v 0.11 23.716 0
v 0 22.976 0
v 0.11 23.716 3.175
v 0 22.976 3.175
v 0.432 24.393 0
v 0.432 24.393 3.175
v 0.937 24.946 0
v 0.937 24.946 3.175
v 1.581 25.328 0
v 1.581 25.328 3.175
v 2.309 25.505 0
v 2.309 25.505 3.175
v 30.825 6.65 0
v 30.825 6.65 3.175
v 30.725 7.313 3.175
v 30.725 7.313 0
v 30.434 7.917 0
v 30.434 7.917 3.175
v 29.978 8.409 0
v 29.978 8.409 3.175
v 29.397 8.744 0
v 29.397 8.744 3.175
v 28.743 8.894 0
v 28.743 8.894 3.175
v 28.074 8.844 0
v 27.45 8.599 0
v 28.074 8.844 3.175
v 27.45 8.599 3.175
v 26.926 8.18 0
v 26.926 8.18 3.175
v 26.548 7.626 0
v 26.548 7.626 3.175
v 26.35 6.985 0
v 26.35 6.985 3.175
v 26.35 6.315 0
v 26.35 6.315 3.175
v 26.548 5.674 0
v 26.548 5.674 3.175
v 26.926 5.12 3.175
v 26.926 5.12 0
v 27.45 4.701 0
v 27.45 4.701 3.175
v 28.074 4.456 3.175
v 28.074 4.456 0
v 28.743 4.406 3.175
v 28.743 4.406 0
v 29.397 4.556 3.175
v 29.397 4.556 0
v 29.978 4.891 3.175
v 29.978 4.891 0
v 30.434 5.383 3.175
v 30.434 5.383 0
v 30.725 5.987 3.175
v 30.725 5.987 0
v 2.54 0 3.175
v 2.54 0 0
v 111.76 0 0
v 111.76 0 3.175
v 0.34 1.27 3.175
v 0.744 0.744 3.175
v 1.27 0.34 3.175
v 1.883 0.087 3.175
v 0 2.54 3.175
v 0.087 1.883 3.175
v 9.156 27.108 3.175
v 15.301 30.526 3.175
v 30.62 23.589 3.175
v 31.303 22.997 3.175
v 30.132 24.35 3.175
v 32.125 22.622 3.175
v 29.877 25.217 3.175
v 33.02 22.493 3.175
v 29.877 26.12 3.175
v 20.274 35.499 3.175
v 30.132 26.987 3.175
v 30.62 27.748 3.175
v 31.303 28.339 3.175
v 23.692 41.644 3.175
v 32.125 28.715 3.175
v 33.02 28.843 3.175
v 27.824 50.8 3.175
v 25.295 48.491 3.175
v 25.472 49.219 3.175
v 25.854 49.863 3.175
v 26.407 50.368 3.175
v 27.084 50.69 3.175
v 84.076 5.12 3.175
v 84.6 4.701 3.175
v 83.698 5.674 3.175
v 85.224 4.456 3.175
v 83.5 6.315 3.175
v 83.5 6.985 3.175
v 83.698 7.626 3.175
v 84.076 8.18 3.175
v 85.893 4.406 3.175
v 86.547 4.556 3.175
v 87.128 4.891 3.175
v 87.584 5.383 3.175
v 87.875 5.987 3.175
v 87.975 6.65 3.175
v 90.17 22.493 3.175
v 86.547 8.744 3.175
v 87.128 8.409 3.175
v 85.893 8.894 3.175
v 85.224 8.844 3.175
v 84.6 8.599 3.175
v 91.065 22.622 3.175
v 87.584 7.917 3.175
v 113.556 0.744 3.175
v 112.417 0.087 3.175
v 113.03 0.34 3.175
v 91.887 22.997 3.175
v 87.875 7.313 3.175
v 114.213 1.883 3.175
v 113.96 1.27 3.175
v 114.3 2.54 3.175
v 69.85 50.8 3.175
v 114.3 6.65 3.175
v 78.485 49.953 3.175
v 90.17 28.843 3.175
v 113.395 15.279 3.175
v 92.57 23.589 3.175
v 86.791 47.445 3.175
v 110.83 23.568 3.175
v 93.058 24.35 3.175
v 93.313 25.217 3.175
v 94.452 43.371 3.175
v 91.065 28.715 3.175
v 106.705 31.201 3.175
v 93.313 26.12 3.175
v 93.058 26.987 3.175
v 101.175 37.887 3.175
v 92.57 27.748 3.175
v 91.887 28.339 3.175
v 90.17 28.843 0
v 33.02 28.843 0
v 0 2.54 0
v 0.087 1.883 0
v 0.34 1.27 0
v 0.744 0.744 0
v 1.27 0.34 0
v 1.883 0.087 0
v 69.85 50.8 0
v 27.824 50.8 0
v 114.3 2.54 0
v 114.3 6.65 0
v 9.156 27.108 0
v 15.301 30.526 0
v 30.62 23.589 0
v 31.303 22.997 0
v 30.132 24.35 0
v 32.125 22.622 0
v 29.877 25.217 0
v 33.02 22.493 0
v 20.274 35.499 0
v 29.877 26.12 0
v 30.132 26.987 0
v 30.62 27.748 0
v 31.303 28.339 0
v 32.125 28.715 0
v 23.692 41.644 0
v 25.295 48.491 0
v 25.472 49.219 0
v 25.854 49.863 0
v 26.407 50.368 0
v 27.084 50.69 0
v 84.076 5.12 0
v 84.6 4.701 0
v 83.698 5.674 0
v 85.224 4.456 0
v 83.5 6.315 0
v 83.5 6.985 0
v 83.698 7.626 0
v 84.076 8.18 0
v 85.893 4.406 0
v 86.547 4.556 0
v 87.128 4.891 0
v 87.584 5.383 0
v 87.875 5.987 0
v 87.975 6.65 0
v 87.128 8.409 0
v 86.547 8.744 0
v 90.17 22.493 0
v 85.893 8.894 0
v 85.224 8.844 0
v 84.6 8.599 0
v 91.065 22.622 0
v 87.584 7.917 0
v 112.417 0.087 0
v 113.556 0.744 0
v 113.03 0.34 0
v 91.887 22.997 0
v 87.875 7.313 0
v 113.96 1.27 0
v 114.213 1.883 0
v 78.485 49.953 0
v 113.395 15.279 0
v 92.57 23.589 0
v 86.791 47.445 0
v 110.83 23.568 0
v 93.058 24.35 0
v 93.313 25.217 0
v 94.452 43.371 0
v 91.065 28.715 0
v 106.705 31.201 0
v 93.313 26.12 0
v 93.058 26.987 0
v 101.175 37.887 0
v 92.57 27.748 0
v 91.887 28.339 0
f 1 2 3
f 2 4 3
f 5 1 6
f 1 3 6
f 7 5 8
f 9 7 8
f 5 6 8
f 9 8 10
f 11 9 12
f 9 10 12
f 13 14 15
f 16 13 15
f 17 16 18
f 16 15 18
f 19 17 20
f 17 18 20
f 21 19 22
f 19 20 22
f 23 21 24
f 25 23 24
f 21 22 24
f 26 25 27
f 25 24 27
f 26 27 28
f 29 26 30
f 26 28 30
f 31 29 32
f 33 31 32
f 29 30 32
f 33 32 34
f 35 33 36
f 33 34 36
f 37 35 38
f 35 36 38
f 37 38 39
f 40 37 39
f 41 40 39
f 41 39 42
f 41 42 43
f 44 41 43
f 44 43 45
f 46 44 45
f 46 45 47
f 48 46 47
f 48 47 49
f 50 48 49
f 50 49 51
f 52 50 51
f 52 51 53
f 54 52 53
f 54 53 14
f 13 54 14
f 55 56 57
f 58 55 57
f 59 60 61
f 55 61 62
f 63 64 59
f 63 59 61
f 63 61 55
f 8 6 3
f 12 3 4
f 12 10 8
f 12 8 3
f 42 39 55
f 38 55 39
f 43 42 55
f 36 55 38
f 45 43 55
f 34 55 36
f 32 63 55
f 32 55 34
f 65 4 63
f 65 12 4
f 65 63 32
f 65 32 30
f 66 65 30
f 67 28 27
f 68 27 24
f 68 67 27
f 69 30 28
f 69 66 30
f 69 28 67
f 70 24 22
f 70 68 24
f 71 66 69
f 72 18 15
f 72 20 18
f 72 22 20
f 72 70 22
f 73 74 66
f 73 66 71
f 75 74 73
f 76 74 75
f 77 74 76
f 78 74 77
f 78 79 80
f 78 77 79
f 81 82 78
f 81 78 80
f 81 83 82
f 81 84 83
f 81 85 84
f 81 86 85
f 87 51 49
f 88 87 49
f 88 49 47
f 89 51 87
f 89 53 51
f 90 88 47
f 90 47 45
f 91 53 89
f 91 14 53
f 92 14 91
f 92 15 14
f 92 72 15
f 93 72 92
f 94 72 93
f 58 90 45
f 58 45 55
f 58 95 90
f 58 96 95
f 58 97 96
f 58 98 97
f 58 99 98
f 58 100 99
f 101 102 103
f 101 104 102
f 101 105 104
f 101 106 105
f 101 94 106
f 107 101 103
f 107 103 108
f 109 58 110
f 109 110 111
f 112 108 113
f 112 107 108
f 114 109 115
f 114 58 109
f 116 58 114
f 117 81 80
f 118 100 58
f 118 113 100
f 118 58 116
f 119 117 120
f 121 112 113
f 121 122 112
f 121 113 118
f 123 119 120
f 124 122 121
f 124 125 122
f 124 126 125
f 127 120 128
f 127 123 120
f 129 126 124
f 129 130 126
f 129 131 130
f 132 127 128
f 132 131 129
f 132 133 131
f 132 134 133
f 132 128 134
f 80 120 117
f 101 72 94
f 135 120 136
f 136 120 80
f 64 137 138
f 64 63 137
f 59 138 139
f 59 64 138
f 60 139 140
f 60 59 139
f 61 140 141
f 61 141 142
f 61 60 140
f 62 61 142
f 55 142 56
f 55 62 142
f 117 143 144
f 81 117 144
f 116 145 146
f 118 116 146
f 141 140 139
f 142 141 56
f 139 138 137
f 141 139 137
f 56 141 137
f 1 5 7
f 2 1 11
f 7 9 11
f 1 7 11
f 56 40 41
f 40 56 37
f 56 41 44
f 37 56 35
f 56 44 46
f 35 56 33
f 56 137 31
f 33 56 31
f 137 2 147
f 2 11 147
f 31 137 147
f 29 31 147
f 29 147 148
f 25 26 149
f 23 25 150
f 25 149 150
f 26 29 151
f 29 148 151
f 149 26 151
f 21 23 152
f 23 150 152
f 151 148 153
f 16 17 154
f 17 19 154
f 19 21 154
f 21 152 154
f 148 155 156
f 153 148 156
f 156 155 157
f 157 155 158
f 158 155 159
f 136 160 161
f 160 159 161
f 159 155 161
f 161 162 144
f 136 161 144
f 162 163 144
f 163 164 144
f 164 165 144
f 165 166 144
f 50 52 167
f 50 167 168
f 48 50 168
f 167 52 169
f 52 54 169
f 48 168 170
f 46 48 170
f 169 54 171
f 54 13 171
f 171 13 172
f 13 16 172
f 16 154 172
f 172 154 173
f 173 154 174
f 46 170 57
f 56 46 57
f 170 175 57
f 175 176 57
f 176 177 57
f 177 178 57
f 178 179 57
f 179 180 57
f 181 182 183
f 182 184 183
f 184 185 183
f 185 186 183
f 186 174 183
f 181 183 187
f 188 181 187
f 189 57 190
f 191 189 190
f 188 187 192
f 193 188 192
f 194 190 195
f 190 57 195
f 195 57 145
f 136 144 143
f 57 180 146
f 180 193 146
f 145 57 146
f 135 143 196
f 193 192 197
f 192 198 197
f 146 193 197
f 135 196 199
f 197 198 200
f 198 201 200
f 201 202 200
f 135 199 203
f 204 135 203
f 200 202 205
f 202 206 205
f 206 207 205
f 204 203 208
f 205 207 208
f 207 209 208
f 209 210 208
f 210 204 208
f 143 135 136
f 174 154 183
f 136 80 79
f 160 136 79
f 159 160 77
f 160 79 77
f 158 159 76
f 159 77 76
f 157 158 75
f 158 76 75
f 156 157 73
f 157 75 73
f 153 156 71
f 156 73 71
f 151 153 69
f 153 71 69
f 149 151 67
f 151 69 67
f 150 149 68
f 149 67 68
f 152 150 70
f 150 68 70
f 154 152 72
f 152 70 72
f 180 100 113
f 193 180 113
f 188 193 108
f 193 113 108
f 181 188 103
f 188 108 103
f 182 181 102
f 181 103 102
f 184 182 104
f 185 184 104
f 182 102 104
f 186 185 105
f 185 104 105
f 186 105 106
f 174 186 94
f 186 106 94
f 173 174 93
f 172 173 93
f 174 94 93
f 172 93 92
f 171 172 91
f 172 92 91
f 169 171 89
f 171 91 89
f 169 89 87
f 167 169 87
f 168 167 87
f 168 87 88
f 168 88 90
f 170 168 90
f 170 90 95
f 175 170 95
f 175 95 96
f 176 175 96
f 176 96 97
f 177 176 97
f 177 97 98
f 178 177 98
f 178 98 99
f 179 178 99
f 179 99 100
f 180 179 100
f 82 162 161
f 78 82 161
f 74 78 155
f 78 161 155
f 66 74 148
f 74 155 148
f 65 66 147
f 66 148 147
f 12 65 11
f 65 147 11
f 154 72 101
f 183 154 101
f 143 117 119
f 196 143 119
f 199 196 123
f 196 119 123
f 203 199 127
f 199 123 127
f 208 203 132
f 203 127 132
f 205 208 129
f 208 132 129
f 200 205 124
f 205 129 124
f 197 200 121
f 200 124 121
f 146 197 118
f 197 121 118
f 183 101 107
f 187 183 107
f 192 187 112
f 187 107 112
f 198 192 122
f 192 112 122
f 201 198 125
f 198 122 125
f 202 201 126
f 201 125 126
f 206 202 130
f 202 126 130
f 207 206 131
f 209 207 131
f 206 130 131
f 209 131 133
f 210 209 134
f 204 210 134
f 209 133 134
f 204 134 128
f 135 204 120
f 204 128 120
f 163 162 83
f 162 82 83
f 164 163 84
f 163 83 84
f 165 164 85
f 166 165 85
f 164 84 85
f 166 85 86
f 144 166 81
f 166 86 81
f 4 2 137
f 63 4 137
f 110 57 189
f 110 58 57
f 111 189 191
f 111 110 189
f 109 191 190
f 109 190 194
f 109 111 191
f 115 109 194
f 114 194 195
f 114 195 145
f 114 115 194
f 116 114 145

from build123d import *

# Parameters (mm, degrees)
BOSS_EXTRUDE1_DEPTH = 3.175
SKETCH2_R           = 2.25
CUT_EXTRUDE1_DEPTH  = 126.120784145
FILLET1_R           = 2.54


with BuildPart() as part:
    # Sketch1 → Boss-Extrude1 (new body)
    with BuildSketch(Plane.XY):
        with BuildLine():
            Line((0, 25.4), (0, 0))
            Line((0, 0), (114.3, 0))
            Line((114.3, 0), (114.3, 50.8))
            Line((114.3, 50.8), (25.4, 50.8))
            ThreePointArc((25.4, 50.8), (17.960512242, 32.839487758), (0, 25.4))
        make_face()
    extrude(amount=BOSS_EXTRUDE1_DEPTH)

    # Sketch2 → Cut-Extrude1 (cut, through all)
    with BuildSketch(Plane.XY.offset(3.175)):
        with BuildLine():
            Line((114.3, 50.8), (69.85, 50.8))
            ThreePointArc((69.85, 50.8), (101.175009976, 37.886844698), (114.3, 6.65))
            Line((114.3, 6.65), (114.3, 50.8))
        make_face()
        with Locations((85.725, 6.65)):
            Circle(SKETCH2_R)
        with BuildLine():
            Line((90.17, 28.843472461), (33.02, 28.843472461))
            ThreePointArc((33.02, 28.843472461), (29.845, 25.668472461), (33.02, 22.493472461))
            Line((33.02, 22.493472461), (90.17, 22.493472461))
            ThreePointArc((90.17, 22.493472461), (93.345, 25.668472461), (90.17, 28.843472461))
        make_face()
        with Locations((28.575, 6.65)):
            Circle(SKETCH2_R)
    extrude(amount=-CUT_EXTRUDE1_DEPTH, mode=Mode.SUBTRACT)

    # Fillet1
    fillet1_edges = [part.edges().sort_by_distance(p)[0] for p in [
        (114.3, 0, 1.5875),
        (0, 0, 1.5875),
        (0, 25.4, 1.5875),
        (25.4, 50.8, 1.5875),
    ]]
    fillet(fillet1_edges, radius=FILLET1_R)


solid = part.part
